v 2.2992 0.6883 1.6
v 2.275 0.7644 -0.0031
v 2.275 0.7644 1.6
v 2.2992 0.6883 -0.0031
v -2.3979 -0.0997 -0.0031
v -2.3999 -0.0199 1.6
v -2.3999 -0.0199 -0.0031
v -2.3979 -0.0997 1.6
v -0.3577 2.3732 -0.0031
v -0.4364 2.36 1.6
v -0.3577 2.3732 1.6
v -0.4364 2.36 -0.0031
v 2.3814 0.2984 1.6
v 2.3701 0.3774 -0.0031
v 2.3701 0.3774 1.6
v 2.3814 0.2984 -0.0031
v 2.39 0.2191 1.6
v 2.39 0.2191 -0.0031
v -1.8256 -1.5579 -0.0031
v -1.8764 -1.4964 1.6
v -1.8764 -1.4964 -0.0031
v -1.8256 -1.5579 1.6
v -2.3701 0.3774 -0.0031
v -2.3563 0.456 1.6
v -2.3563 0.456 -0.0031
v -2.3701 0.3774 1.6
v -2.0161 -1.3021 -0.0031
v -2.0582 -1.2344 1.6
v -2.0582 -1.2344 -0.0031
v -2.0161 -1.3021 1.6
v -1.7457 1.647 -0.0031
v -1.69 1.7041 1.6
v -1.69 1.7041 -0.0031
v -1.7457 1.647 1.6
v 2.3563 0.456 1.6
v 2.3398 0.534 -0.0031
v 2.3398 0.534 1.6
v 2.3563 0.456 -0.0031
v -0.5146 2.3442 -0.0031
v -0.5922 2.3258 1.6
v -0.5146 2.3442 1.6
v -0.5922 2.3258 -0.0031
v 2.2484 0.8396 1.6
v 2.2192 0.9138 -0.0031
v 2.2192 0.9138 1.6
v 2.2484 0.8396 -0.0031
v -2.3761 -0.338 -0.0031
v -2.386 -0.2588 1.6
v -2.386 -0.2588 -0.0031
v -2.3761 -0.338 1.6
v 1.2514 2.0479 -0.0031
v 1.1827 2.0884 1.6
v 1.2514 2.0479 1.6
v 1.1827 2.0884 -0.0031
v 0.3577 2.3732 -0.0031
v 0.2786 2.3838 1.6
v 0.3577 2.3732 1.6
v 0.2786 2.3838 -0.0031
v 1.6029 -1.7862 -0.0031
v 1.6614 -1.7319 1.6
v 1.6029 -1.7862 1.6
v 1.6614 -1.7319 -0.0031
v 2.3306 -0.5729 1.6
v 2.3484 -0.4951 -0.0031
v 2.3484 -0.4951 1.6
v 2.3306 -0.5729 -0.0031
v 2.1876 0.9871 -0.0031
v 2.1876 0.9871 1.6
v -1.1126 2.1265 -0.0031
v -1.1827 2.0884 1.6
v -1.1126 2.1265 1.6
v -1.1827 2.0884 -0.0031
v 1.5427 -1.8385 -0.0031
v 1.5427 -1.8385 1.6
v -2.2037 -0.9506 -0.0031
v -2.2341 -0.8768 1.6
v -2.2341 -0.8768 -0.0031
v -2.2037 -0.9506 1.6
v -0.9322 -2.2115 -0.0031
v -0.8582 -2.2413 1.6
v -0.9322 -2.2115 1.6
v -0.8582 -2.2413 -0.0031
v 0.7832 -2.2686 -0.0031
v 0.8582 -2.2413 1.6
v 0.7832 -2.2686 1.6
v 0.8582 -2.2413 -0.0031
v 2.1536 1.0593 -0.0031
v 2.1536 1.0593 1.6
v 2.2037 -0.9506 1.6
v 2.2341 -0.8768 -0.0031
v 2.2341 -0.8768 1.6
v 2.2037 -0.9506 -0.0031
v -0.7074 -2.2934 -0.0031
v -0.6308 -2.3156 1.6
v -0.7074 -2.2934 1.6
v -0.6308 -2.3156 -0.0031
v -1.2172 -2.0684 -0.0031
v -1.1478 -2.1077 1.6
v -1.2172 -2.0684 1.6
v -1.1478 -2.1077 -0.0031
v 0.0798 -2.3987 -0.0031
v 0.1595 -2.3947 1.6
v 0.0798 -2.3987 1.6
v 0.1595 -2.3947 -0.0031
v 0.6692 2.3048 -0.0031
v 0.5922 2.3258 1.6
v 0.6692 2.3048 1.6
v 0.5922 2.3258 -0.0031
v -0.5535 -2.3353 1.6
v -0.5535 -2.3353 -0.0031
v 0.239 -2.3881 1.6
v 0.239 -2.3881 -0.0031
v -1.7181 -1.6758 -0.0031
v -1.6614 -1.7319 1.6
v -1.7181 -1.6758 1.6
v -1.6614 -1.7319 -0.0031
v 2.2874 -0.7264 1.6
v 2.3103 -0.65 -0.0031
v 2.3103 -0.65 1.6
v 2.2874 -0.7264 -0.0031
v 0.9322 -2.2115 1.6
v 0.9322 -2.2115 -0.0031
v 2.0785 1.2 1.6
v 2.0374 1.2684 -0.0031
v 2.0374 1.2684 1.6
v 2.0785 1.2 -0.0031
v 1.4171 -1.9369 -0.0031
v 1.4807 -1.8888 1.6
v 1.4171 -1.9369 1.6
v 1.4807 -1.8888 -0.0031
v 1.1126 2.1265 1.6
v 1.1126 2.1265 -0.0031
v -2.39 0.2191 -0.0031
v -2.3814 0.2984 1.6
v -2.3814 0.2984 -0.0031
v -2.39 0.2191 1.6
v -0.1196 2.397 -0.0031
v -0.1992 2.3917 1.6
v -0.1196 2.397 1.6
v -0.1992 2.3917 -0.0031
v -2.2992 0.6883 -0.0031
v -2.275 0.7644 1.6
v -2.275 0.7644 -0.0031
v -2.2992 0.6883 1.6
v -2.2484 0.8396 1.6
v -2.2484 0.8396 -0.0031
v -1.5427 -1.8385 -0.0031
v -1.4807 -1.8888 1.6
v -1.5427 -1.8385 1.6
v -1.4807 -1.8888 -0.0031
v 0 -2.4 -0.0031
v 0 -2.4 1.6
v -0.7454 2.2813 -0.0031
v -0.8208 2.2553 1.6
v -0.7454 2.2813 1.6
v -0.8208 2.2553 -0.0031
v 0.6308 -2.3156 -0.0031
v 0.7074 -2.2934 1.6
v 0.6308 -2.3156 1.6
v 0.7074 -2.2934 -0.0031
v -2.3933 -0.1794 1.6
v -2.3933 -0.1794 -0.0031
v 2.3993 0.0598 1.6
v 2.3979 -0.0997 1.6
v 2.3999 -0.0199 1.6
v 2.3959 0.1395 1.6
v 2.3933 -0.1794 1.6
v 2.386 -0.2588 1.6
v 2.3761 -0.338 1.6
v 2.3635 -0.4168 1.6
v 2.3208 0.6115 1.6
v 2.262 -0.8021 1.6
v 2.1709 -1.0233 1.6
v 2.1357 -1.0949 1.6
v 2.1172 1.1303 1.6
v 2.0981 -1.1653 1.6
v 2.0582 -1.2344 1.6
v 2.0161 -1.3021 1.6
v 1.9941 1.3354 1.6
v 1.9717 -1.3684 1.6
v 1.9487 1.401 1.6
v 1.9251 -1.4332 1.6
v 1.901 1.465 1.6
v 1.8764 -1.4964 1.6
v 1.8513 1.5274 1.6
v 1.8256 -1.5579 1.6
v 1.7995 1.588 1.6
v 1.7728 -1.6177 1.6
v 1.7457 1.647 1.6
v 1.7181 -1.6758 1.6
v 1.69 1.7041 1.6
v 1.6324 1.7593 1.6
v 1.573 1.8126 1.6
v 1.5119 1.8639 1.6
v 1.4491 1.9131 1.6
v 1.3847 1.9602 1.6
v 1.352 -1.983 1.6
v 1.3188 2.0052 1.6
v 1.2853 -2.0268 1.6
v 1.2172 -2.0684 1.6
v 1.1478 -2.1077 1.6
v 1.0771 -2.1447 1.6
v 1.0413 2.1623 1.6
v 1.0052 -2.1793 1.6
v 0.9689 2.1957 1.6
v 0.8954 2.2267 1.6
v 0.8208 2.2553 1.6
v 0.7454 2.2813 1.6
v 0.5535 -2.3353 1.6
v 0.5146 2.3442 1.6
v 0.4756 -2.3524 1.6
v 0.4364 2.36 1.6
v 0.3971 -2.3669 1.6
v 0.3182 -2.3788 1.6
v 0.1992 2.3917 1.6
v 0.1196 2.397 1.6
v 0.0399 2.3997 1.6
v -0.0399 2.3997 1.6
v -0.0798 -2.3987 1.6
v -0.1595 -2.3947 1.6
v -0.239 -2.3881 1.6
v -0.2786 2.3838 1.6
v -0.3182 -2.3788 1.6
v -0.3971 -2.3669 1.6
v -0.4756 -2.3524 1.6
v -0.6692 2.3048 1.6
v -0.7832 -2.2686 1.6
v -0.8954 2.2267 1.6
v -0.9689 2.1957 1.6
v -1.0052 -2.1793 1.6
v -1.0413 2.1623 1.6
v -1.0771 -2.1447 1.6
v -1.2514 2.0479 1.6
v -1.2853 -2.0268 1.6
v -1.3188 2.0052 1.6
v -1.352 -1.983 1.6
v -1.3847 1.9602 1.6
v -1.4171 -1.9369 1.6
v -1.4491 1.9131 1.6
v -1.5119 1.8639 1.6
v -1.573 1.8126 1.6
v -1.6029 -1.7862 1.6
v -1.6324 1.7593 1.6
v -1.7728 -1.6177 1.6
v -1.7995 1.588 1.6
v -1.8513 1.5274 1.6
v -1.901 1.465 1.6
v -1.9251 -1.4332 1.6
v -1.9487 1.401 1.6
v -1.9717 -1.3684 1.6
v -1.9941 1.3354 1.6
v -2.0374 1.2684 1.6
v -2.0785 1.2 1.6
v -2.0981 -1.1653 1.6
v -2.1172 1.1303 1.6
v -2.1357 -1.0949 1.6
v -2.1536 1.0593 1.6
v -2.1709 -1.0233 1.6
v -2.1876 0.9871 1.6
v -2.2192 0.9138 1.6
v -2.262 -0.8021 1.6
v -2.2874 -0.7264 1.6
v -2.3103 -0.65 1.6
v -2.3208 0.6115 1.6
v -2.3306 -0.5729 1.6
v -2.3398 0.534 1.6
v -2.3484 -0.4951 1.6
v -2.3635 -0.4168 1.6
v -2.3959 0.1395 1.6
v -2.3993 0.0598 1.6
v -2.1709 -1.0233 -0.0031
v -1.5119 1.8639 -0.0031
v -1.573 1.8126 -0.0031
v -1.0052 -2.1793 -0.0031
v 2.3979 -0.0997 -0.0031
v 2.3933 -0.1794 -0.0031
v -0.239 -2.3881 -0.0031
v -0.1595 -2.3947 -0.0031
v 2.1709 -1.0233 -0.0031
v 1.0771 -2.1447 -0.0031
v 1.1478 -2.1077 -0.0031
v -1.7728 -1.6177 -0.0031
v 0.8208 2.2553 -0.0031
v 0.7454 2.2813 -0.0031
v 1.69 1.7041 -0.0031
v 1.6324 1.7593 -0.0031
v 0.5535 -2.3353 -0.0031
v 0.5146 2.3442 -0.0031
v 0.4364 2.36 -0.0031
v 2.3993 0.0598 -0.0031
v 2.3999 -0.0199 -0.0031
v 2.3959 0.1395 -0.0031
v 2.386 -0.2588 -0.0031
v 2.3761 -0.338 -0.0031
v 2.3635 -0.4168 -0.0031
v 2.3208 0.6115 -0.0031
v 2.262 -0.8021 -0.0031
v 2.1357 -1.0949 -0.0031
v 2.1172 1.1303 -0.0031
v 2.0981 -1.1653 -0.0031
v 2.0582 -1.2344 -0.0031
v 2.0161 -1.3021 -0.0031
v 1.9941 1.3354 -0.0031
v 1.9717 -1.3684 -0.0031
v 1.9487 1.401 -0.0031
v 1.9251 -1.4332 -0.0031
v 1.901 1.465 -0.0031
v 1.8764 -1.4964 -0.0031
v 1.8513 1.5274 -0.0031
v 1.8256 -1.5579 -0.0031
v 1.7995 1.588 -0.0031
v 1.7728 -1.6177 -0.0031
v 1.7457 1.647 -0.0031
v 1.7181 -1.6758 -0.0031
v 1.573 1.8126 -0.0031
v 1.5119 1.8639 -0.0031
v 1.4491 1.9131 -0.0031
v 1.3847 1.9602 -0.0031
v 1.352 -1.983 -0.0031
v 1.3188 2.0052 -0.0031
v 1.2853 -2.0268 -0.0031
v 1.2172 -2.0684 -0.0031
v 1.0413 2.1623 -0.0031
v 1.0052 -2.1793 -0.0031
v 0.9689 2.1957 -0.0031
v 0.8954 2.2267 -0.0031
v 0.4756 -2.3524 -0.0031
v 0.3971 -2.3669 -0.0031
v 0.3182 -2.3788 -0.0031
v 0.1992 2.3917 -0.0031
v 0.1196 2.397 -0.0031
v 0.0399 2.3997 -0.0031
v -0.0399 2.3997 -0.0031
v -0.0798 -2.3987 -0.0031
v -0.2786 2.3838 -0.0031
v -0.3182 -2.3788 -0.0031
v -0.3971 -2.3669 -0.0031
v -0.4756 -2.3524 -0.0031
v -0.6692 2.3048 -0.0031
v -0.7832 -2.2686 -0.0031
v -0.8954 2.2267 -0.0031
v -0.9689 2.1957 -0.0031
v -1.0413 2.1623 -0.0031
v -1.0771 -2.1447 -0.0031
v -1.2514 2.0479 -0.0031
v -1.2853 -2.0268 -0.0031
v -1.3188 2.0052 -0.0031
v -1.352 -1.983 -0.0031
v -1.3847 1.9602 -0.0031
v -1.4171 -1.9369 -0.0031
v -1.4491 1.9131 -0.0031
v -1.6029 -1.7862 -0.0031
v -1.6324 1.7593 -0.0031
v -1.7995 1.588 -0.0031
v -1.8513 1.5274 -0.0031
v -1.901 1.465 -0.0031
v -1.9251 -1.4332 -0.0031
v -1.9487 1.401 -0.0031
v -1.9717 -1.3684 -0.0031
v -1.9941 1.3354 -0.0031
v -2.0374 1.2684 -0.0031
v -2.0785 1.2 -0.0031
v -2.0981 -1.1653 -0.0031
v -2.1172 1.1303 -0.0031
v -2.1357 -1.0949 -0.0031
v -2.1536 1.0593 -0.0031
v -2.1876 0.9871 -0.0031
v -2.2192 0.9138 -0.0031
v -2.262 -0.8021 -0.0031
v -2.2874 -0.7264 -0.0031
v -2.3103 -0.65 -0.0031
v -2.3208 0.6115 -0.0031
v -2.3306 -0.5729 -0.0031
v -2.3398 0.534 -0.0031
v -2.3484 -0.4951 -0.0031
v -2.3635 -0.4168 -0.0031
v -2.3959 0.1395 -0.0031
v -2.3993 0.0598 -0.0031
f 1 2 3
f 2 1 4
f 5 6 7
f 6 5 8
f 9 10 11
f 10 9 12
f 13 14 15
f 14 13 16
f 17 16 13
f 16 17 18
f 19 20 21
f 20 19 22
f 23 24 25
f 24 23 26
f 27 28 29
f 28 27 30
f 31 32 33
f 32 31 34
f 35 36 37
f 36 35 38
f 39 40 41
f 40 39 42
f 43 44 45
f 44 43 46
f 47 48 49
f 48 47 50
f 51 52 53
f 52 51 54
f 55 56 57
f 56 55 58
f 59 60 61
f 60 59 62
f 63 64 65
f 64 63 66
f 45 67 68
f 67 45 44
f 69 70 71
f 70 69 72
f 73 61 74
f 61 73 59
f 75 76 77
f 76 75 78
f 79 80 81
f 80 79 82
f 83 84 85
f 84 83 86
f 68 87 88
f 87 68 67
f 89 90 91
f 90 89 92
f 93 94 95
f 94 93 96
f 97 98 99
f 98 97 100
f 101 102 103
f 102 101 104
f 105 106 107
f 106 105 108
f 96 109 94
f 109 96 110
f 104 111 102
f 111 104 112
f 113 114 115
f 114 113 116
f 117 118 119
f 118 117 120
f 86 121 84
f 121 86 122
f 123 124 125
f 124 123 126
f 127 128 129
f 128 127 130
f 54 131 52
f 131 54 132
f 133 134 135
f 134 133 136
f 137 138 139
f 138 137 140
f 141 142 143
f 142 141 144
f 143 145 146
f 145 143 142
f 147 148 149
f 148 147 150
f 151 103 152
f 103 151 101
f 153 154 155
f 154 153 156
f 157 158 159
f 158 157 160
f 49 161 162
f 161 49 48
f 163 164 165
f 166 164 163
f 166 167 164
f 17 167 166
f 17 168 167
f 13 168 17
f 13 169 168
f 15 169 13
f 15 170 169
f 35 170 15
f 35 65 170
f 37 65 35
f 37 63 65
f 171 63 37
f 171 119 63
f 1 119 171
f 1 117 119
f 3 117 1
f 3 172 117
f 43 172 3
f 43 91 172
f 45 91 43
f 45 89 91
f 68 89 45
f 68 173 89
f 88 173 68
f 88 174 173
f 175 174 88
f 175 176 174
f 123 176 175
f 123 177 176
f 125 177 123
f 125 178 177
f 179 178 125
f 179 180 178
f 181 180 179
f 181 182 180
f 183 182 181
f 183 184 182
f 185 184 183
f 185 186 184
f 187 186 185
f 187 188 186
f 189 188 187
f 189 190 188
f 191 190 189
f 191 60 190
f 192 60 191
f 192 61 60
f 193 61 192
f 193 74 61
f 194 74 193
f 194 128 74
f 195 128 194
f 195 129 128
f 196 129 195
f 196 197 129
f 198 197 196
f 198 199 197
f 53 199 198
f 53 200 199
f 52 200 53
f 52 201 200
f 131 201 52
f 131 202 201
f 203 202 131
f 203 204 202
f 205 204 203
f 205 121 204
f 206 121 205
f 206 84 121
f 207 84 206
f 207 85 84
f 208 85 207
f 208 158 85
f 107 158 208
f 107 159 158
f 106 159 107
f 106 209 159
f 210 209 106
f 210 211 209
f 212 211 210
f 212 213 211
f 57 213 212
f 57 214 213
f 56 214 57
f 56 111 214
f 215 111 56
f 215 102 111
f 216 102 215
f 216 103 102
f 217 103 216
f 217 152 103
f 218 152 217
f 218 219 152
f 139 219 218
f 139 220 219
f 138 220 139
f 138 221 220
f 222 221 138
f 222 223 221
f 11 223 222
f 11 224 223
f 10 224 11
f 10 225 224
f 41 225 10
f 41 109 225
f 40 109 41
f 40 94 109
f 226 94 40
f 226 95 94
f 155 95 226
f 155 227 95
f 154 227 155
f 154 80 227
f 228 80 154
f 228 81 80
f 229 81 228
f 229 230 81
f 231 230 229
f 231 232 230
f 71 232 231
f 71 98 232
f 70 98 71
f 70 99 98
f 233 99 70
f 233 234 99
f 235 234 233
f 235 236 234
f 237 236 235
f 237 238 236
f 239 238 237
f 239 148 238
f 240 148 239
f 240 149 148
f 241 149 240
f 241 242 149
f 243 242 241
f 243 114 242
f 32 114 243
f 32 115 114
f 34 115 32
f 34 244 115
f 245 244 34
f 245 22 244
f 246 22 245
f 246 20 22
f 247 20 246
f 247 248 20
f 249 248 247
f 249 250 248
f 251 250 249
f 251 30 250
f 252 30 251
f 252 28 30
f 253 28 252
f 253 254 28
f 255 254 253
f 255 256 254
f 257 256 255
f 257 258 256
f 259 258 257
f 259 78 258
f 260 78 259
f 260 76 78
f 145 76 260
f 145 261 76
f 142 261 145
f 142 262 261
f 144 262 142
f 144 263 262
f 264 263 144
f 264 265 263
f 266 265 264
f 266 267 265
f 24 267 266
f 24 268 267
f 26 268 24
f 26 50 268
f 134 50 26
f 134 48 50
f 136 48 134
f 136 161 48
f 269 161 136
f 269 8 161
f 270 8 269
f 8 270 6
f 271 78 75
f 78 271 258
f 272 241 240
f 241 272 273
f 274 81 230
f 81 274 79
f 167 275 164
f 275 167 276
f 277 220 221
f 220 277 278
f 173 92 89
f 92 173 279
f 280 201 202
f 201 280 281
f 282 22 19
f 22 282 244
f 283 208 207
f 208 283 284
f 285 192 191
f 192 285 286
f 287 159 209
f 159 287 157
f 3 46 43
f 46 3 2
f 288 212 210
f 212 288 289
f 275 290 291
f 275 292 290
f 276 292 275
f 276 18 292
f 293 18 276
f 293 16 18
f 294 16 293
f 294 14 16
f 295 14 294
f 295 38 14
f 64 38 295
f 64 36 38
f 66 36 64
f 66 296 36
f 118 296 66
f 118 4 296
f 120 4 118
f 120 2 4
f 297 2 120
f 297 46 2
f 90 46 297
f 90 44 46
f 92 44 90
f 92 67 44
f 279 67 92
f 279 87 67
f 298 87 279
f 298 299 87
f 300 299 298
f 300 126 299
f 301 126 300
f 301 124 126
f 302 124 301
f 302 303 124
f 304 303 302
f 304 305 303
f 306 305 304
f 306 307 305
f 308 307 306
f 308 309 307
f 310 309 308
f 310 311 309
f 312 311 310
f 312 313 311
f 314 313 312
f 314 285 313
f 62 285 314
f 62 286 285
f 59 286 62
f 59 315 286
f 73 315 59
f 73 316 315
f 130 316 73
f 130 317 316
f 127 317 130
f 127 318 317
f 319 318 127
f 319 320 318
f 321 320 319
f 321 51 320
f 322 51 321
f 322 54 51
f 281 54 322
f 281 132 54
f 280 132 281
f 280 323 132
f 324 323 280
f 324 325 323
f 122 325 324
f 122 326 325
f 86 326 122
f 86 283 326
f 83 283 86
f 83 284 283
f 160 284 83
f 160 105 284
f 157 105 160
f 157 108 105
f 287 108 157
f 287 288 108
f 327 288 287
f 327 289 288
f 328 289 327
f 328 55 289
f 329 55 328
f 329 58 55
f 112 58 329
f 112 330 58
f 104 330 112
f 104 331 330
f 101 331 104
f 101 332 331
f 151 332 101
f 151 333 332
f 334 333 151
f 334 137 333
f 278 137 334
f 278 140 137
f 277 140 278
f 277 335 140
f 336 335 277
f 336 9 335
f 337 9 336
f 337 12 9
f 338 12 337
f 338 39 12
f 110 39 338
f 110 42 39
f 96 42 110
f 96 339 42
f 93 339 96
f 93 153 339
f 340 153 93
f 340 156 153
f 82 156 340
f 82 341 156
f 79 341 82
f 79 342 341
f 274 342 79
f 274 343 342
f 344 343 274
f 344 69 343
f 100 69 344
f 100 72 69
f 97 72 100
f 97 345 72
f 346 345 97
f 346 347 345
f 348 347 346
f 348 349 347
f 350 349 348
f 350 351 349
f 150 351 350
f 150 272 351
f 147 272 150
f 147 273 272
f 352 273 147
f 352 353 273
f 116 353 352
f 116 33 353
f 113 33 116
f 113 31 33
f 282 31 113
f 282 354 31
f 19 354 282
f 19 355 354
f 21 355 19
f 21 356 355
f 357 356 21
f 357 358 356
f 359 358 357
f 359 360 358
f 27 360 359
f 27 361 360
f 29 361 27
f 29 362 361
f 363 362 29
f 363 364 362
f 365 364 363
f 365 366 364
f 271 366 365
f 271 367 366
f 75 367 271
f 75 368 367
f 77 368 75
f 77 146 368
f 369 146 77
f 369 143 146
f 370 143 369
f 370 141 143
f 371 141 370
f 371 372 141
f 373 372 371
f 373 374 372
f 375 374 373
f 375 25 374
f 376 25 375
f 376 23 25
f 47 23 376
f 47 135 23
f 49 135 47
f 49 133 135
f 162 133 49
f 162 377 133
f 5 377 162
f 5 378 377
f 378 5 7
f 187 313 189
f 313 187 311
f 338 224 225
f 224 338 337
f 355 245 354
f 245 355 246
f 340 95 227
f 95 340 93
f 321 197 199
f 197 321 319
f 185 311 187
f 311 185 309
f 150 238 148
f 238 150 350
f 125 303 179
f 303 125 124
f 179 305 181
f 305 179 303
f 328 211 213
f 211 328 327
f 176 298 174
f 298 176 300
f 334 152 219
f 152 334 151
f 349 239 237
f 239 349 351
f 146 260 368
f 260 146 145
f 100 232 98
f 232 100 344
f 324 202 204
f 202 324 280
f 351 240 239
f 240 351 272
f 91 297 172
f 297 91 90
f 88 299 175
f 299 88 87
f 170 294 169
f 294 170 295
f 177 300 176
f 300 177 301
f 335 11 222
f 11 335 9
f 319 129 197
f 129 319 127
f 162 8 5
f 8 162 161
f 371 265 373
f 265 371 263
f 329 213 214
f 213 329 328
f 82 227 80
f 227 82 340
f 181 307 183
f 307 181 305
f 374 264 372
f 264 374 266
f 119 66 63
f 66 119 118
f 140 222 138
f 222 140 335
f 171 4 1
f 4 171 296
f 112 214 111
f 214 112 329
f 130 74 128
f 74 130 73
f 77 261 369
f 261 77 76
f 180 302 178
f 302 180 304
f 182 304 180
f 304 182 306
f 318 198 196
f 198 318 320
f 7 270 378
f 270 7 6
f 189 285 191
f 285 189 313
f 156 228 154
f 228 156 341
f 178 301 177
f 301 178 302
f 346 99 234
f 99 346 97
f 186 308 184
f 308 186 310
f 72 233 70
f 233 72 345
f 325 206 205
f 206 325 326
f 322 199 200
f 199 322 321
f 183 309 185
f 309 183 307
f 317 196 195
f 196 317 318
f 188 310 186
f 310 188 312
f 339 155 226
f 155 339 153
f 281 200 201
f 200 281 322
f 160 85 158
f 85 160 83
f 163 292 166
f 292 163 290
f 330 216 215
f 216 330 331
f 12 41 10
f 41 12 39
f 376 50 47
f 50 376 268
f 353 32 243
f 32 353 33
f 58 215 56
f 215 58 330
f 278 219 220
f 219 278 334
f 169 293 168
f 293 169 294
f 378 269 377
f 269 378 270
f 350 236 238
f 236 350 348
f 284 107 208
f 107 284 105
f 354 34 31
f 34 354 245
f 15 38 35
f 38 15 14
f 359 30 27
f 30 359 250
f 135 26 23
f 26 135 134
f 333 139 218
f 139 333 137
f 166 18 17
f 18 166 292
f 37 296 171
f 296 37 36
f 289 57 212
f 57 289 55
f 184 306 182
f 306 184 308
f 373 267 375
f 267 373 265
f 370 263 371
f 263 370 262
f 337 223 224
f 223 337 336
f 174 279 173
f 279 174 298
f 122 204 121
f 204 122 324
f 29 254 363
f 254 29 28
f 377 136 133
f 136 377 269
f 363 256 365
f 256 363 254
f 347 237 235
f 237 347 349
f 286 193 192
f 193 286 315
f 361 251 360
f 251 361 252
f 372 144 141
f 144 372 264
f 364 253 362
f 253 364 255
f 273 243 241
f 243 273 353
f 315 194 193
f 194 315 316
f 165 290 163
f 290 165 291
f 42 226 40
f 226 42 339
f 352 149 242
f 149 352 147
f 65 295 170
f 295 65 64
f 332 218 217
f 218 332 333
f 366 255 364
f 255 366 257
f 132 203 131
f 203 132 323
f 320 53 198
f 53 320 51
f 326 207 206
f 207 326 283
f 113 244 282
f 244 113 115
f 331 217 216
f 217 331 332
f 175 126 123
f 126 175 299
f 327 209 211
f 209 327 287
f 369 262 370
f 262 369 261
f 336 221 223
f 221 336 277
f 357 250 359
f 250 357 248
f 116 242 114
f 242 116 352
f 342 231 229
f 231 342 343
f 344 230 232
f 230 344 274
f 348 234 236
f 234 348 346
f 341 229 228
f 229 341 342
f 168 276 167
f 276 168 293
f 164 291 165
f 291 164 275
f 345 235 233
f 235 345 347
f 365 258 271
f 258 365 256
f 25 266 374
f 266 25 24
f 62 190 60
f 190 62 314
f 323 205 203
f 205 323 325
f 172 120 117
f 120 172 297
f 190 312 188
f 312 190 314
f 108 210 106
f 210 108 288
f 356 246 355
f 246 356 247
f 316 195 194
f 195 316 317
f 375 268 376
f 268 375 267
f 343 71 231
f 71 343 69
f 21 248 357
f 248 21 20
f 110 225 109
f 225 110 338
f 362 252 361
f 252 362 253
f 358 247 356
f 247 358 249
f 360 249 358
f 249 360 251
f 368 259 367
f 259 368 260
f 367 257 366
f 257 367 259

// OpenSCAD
use <../lib.scad>
use <s/3960pv1a.scad>
use <s/3960pvb.scad>
use <s/3960s01.scad>
$fa=1; $fs=0.2;
function ldraw_lib__3960pv1(realsolid=false) = [
// 0 Dish  4 x  4 Inverted with Viking Dark Red and Yellow Rune Shield Pattern
// 0 Name: 3960pv1.dat
// 0 Author: Philippe Hurbain [Philo]
// 0 !LDRAW_ORG Part UPDATE 2022-04
// 0 !LICENSE Licensed under CC BY 2.0 and CC BY 4.0 : see CAreadme.txt
// 
// 0 BFC CERTIFY CCW
  [0,"BFC","CERTIFY"],
  [0,"BFC","CCW"],
// 
// 0 !KEYWORDS Bricklink 3960pb015, Round, Set 7018, Set 7019, Set 7020
// 
// 0 !HISTORY 2009-12-29 [PTadmin] Official Update 2009-03
// 0 !HISTORY 2010-05-09 [cwdee] Remove CATEGORY Round
// 0 !HISTORY 2010-07-05 [PTadmin] Official Update 2010-02
// 0 !HISTORY 2022-06-22 [Philo] Updated description, added keywords
// 0 !HISTORY 2022-07-18 [PTadmin] Official Update 2022-04
// 
// 
// 1 16 0 0 0 1 0 0 0 1 0 0 0 1 s\3960s01.dat
  [1,16,0,0,0,1,0,0,0,1,0,0,0,1, ldraw_lib__s__3960s01(realsolid)],
// 1 16 0 0 0 1 0 0 0 1 0 0 0 1 s\3960pv1a.dat
  [1,16,0,0,0,1,0,0,0,1,0,0,0,1, ldraw_lib__s__3960pv1a(realsolid)],
// 1 16 0 0 0 1 0 0 0 1 0 0 0 1 s\3960pvb.dat
  [1,16,0,0,0,1,0,0,0,1,0,0,0,1, ldraw_lib__s__3960pvb(realsolid)],
// 1 16 0 0 0 -1 0 0 0 1 0 0 0 1 s\3960pvb.dat
  [1,16,0,0,0,-1,0,0,0,1,0,0,0,1, ldraw_lib__s__3960pvb(realsolid)],
// 1 16 0 0 0 0 0 -1 0 1 0 1 0 0 s\3960pvb.dat
  [1,16,0,0,0,0,0,-1,0,1,0,1,0,0, ldraw_lib__s__3960pvb(realsolid)],
// 1 16 0 0 0 0 0 -1 0 1 0 -1 0 0 s\3960pvb.dat
  [1,16,0,0,0,0,0,-1,0,1,0,-1,0,0, ldraw_lib__s__3960pvb(realsolid)],
// 1 16 0 0 0 0 0 1 0 1 0 -1 0 0 s\3960pvb.dat
  [1,16,0,0,0,0,0,1,0,1,0,-1,0,0, ldraw_lib__s__3960pvb(realsolid)],
// 1 16 0 0 0 0 0 1 0 1 0 1 0 0 s\3960pvb.dat
  [1,16,0,0,0,0,0,1,0,1,0,1,0,0, ldraw_lib__s__3960pvb(realsolid)],
// 1 16 0 0 0 -1 0 0 0 1 0 0 0 -1 s\3960pvb.dat
  [1,16,0,0,0,-1,0,0,0,1,0,0,0,-1, ldraw_lib__s__3960pvb(realsolid)],
// 1 16 0 0 0 1 0 0 0 1 0 0 0 -1 s\3960pvb.dat
  [1,16,0,0,0,1,0,0,0,1,0,0,0,-1, ldraw_lib__s__3960pvb(realsolid)],
// 0
];
module ldraw_lib__3960pv1(step=0, col=false, unit=2/5, alt=false, line=0.2, solid=!$preview)
    makepoly(ldraw_lib__3960pv1(solid), step=step, col=col, unit=unit, alt=alt, line=line, solid=solid);
ldraw_lib__3960pv1(line=0.2);
